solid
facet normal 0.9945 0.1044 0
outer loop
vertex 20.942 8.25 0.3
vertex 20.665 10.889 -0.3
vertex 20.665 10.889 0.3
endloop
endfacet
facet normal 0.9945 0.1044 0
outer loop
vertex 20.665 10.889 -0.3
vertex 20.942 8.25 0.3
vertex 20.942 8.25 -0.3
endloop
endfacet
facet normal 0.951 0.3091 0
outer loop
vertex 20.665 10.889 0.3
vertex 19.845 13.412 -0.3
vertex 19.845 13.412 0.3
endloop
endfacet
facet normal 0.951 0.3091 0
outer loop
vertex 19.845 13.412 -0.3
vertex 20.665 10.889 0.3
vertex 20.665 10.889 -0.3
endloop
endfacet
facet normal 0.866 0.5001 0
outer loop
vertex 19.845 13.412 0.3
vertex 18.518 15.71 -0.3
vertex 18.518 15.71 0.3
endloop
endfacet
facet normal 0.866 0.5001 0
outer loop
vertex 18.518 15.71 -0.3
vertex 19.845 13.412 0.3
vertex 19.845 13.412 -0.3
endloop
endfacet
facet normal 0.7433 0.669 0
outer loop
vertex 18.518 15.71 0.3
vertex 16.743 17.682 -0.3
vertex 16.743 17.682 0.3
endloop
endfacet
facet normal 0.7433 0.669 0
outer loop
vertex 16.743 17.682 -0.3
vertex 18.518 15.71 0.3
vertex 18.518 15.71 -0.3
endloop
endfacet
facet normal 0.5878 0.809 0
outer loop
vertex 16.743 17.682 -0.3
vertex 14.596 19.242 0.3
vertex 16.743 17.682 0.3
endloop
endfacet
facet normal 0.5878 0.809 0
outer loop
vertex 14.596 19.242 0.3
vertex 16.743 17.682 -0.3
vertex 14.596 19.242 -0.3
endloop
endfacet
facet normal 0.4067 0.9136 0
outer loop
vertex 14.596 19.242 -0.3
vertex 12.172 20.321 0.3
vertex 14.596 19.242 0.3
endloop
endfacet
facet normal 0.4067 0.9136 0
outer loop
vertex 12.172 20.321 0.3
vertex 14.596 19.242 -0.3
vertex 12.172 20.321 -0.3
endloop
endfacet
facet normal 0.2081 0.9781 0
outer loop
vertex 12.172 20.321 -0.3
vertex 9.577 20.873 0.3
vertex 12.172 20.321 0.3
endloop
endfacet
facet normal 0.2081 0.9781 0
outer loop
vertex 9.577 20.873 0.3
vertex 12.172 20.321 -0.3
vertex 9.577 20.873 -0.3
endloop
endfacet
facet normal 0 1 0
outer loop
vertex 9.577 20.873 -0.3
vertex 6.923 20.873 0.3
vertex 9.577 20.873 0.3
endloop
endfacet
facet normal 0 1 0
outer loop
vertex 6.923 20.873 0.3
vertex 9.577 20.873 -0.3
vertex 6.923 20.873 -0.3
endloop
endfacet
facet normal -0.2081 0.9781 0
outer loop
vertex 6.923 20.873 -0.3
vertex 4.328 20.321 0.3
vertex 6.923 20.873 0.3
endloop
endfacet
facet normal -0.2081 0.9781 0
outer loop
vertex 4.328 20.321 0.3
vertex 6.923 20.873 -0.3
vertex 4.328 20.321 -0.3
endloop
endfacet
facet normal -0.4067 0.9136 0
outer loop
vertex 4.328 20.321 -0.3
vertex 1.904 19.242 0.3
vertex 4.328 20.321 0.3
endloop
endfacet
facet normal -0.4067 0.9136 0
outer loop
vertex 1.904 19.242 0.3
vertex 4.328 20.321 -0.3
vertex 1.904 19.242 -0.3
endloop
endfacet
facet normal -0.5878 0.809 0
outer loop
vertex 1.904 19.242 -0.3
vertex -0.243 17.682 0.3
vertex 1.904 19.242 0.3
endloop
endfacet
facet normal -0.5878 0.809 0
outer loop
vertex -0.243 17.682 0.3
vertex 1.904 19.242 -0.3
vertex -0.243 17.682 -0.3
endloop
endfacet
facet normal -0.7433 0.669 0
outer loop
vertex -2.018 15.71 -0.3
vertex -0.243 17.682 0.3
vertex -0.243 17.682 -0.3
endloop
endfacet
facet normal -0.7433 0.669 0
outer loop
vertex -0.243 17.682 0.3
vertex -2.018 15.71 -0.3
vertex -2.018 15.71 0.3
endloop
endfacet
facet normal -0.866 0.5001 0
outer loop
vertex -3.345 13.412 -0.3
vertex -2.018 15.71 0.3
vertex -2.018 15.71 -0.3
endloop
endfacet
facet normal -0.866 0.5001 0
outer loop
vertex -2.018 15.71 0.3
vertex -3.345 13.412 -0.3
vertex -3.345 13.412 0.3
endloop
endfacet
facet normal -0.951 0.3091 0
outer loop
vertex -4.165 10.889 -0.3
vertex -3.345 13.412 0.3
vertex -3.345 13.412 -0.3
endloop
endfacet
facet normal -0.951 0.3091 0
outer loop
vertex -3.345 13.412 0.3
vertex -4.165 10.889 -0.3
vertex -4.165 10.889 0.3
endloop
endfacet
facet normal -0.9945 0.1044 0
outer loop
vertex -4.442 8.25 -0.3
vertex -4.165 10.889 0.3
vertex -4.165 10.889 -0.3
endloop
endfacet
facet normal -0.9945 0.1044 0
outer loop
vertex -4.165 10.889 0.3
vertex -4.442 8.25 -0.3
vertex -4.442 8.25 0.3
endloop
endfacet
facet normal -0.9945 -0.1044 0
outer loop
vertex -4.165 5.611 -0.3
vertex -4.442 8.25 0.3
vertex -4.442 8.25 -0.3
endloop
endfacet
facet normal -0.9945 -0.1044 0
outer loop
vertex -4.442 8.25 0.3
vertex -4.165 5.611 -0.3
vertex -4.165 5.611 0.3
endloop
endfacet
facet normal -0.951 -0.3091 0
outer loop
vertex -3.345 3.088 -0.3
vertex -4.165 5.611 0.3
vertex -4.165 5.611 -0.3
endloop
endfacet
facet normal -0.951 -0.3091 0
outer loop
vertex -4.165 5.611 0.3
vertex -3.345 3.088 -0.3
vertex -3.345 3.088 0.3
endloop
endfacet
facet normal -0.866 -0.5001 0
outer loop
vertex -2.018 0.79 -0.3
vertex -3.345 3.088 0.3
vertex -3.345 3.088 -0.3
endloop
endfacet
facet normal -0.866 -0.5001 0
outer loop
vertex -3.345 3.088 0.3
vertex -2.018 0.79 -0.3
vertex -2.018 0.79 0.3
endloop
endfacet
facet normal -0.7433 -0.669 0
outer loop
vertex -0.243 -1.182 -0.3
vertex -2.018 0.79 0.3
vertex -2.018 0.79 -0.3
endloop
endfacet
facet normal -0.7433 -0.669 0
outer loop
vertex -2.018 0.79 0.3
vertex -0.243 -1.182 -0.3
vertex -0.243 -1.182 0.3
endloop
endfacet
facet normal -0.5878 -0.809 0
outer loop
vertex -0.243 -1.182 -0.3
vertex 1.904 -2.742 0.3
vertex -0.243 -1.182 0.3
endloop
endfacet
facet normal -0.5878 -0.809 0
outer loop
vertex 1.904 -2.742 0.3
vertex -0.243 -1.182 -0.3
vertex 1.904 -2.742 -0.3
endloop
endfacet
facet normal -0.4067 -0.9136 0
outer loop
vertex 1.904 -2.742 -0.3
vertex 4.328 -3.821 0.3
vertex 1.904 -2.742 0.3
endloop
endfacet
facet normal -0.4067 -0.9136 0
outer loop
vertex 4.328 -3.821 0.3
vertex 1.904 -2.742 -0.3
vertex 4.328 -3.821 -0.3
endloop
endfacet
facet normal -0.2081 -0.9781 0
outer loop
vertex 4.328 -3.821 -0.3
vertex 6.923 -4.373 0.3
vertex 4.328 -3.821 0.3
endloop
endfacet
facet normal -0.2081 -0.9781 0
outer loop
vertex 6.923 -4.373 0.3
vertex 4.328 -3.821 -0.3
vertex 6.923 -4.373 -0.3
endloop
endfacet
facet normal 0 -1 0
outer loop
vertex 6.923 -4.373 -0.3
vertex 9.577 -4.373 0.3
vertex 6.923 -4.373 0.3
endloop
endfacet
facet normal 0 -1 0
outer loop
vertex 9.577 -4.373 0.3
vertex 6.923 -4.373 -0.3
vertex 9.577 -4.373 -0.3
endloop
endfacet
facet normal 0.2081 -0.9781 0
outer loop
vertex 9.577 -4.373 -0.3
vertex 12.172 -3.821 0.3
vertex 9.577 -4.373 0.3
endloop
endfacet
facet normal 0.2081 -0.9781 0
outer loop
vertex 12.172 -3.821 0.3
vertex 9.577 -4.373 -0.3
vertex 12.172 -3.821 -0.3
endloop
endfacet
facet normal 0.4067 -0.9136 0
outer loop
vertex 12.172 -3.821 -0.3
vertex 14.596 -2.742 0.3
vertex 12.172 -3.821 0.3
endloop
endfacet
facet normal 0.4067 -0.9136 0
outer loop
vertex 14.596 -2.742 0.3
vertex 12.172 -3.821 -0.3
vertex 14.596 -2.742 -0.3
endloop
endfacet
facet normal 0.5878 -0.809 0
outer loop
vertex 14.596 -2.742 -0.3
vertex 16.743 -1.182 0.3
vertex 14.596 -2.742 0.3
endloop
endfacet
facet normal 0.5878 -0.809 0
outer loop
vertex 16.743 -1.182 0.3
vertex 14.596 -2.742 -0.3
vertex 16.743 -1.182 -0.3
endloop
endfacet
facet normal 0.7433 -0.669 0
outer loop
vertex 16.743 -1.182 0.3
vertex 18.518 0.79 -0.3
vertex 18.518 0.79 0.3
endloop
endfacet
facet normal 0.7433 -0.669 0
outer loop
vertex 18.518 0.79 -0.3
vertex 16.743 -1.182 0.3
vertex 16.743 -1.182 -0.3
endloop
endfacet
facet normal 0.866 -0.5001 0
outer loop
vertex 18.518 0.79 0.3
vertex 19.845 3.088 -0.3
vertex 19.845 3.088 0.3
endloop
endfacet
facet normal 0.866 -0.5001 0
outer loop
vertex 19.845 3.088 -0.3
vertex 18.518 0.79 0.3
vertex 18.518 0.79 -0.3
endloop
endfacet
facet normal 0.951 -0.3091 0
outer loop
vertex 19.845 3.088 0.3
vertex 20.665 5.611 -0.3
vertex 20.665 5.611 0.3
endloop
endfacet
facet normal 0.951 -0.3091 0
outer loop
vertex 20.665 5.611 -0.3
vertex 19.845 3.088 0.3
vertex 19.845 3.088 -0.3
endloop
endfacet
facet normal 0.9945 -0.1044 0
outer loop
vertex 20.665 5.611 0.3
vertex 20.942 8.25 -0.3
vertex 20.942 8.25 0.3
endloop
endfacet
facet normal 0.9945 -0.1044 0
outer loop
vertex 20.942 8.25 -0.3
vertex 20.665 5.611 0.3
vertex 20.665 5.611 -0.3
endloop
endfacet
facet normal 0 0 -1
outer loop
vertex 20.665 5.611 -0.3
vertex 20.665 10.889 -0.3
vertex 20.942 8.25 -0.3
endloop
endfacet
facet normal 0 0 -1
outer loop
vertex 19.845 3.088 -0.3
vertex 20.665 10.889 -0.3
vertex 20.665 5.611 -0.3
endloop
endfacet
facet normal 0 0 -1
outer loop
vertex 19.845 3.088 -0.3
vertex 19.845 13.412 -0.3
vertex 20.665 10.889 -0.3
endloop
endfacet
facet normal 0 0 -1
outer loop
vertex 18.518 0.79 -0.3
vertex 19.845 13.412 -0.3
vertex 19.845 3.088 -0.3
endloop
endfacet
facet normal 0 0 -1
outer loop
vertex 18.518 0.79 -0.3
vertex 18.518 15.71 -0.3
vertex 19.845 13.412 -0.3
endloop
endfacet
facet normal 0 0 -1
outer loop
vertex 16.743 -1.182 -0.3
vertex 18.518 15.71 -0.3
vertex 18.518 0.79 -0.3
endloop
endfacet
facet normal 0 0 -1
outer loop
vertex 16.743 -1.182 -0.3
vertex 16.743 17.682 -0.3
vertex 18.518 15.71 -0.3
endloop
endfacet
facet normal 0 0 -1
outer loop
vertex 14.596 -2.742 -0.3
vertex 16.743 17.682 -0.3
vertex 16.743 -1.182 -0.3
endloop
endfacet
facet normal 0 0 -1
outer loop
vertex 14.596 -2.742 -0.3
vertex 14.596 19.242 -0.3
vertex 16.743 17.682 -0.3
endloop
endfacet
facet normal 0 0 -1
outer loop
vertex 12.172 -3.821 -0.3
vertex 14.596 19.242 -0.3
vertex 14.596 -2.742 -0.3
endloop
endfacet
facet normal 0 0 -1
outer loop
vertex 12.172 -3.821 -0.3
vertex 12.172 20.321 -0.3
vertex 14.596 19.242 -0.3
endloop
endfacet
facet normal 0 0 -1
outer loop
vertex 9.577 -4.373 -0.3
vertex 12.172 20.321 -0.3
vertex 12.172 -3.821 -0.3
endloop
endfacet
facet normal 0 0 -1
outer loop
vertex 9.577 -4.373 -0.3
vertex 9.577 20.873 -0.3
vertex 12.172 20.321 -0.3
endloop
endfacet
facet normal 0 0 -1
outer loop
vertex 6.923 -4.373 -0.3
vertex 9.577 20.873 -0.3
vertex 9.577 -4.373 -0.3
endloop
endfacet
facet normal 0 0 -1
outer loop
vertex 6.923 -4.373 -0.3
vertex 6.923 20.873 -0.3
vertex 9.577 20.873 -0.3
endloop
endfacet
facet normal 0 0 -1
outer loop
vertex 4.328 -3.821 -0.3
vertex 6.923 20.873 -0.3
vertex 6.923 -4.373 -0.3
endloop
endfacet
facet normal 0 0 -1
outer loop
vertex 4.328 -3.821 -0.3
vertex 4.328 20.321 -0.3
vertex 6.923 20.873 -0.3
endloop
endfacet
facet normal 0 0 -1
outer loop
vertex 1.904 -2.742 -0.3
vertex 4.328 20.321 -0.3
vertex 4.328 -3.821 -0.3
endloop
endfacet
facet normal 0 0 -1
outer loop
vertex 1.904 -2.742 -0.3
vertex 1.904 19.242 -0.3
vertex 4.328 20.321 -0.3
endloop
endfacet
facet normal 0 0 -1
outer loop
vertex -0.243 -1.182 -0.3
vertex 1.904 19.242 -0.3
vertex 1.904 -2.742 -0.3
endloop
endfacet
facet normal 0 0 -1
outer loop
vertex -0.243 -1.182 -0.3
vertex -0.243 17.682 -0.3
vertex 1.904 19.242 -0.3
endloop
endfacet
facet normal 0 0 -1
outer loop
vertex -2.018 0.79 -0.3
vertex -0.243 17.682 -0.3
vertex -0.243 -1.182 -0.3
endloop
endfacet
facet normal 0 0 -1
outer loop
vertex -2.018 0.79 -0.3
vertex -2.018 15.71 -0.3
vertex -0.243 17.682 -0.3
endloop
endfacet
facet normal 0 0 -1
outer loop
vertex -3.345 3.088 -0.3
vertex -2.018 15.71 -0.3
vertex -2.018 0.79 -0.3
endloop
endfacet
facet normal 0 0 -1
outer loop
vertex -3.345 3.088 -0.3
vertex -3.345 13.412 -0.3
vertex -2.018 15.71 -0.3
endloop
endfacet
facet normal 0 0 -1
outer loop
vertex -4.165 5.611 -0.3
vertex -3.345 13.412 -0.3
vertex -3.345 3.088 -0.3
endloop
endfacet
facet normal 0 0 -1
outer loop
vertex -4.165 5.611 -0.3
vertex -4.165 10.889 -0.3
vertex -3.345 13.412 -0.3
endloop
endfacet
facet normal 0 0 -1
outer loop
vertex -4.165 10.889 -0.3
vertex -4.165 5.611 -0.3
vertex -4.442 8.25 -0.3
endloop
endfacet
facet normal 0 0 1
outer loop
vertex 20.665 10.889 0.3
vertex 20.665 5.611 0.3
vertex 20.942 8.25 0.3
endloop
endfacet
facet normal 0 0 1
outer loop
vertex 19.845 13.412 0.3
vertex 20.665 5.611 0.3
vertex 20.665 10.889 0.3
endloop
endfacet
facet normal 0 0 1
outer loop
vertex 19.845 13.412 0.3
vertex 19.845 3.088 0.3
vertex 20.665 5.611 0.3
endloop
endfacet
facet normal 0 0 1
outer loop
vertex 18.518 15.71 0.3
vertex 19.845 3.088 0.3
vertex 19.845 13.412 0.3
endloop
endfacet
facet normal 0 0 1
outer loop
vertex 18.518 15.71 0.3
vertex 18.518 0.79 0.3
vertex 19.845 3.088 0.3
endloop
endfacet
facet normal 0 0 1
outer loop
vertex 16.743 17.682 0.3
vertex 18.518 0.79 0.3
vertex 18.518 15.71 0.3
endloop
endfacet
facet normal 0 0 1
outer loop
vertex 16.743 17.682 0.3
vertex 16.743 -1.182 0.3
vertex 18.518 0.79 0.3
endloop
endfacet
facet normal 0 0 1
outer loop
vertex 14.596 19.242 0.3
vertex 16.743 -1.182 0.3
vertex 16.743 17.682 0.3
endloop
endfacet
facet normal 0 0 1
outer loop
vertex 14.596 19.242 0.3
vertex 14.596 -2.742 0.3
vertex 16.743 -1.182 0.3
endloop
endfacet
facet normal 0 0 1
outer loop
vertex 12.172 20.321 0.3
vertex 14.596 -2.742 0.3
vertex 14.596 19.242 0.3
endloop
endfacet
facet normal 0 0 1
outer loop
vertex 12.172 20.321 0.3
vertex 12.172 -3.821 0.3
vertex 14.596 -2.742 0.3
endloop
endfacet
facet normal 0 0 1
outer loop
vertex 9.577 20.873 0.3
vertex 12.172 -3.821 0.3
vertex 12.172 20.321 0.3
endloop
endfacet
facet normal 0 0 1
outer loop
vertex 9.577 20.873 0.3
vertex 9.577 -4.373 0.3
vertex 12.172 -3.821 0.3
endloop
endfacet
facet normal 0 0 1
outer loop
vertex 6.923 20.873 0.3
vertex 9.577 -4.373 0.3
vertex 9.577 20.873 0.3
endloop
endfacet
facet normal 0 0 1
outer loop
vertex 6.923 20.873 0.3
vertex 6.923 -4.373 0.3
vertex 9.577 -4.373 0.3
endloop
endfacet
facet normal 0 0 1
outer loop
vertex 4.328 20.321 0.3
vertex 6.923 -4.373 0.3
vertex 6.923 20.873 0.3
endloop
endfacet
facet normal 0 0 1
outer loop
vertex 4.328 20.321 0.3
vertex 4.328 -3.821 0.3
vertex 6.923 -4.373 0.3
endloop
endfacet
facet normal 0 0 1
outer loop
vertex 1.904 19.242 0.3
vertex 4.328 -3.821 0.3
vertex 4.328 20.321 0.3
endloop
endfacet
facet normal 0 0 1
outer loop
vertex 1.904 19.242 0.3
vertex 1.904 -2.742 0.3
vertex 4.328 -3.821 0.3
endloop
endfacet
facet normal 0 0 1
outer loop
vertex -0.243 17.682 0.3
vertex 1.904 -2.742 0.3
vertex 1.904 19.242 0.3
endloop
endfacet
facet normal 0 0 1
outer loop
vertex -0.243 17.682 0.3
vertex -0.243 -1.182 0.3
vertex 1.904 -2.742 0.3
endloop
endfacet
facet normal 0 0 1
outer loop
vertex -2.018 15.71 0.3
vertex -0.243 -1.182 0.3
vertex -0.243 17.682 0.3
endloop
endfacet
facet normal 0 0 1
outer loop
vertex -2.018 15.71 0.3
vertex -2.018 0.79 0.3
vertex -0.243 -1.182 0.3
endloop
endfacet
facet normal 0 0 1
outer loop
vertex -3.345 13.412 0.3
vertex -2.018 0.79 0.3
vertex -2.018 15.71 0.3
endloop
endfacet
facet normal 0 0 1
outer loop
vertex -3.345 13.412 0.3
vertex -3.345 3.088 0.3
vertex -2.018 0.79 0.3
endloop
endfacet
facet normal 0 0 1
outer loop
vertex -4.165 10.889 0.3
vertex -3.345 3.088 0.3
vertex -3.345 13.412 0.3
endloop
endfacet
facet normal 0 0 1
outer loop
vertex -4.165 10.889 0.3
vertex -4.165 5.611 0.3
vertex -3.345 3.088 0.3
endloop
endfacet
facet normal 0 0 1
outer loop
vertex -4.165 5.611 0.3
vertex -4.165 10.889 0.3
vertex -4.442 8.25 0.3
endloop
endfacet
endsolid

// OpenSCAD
rotate([0,0,0])difference()translate([8.25,8.25,0])  cylinder(r=12.6923076923077,h=0.6, center=true);
